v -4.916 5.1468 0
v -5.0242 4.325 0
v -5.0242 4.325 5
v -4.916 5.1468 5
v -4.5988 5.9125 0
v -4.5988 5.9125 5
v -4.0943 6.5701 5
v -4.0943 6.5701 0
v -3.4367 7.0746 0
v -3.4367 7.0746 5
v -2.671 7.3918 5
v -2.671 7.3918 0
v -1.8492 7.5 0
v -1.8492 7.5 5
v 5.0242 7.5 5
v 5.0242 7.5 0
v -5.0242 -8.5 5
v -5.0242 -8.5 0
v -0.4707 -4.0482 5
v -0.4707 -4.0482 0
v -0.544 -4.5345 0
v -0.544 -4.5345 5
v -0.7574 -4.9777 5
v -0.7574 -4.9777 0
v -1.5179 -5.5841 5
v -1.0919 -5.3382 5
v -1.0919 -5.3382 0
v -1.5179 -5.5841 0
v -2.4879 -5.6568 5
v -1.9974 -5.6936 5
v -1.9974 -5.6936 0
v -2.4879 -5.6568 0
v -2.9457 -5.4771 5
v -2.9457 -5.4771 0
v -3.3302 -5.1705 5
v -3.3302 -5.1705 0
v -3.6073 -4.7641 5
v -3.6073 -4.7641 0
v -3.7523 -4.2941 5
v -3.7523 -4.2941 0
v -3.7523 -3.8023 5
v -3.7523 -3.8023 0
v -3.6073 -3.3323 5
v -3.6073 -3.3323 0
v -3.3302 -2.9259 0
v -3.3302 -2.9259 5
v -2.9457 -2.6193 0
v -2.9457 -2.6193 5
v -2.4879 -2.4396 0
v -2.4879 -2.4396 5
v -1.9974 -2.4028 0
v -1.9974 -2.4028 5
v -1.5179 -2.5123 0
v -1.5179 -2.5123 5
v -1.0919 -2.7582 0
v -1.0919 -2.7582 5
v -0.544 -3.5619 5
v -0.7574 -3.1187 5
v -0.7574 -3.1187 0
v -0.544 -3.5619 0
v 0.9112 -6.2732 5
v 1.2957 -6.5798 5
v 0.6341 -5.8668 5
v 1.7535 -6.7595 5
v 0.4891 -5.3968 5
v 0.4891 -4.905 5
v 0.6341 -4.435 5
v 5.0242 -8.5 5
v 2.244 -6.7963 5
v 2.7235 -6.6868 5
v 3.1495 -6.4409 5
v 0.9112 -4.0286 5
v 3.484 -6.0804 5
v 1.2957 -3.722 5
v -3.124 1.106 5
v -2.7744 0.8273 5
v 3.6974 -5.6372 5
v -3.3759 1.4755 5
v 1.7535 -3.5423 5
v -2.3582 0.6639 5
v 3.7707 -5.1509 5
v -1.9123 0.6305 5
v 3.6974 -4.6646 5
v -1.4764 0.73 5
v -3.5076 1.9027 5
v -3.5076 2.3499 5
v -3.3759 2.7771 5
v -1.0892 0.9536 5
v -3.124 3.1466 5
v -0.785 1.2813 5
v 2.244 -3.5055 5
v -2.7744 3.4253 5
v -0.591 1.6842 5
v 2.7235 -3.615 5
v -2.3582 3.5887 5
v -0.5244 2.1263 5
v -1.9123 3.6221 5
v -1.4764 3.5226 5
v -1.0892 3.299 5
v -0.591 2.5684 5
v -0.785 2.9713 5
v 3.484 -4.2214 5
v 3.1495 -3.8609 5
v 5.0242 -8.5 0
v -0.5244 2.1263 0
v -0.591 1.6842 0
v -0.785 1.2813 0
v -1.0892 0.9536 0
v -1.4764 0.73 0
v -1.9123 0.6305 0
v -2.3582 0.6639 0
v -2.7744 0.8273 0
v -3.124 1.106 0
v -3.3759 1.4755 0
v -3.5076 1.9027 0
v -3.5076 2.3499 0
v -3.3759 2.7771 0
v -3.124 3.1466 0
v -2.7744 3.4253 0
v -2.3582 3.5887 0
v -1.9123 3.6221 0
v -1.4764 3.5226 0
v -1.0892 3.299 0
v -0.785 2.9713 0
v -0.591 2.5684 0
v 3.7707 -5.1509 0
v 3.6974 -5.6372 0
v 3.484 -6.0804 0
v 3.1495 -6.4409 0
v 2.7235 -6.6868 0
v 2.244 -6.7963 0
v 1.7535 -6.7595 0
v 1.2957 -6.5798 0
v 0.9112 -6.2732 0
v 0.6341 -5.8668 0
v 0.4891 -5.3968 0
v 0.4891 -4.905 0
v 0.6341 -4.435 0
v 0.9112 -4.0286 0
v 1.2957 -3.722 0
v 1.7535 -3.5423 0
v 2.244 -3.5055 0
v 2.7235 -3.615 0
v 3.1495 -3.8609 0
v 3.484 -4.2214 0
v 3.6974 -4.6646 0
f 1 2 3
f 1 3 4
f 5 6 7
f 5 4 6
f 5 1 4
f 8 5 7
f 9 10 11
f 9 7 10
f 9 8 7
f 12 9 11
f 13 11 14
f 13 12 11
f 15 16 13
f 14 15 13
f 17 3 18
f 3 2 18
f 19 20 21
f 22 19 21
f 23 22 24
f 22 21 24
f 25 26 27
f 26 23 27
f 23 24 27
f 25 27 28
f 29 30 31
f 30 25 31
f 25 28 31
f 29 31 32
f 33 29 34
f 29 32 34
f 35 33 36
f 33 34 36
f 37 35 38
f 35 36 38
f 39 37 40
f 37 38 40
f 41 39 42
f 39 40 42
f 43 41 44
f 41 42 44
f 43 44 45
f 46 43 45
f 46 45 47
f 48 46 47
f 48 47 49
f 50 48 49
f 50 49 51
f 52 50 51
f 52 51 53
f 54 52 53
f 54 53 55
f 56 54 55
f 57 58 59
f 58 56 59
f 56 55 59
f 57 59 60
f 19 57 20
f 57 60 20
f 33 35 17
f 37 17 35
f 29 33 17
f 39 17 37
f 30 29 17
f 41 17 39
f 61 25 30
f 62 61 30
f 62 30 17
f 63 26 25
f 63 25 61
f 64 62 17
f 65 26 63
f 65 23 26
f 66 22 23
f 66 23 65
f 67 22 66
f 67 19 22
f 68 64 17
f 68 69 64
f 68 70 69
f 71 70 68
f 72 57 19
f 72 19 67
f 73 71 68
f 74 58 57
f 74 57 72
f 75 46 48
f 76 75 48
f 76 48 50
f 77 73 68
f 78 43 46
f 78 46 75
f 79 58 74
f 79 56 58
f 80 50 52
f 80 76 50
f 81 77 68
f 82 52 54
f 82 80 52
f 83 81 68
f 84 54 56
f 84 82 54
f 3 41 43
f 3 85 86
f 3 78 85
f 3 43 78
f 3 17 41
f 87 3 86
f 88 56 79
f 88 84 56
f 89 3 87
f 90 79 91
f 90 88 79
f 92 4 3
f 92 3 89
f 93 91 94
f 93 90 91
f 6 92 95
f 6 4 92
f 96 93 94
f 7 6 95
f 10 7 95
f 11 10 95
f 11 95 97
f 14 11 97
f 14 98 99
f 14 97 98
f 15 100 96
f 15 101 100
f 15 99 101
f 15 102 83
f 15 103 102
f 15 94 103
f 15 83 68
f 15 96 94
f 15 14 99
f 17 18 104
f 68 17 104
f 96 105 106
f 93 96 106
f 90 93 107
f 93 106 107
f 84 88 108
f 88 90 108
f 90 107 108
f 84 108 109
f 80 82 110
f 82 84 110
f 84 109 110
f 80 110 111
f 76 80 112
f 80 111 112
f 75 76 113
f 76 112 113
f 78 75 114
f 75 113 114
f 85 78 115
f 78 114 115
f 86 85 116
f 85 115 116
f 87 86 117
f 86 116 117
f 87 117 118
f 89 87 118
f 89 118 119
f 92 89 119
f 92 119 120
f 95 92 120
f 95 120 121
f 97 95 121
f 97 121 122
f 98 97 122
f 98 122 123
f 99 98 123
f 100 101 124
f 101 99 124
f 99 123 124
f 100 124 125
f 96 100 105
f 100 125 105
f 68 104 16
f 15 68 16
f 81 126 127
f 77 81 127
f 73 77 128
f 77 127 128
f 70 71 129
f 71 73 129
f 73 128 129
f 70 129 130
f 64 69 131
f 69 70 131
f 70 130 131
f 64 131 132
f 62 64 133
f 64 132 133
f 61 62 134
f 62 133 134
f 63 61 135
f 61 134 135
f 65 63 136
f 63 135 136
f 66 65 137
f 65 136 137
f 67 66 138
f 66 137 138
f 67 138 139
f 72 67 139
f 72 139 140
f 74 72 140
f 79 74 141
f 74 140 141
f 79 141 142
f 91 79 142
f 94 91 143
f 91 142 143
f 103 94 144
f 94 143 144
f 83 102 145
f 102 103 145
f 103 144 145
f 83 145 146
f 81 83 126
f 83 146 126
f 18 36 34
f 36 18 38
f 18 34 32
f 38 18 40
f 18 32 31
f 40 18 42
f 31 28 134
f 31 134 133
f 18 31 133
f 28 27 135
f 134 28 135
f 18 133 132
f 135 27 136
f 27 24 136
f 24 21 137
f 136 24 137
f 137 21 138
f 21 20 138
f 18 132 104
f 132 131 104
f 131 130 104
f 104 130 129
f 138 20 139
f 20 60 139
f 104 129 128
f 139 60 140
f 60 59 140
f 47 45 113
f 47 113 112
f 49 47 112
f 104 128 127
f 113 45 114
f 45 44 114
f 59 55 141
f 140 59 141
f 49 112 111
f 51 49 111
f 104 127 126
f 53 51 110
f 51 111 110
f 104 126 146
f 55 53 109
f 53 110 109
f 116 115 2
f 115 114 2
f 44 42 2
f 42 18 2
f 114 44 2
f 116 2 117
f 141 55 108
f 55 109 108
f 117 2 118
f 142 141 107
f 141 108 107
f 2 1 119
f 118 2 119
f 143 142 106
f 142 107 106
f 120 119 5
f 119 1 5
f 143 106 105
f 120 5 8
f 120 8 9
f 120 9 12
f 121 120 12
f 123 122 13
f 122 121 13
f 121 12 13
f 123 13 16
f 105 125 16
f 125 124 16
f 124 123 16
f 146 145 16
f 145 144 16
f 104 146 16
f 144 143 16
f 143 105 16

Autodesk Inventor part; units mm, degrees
ref_plane "YZ Plane" through (0, 0, 0) normal (1, 0, 0) x (0, 1, 0)
ref_plane "XZ Plane" through (0, 0, 0) normal (0, 1, 0) x (-1, 0, 0)
ref_plane "XY Plane" through (0, 0, 0) normal (0, 0, 1) x (1, 0, 0)
sketch "Эскиз1" plane through (0, 0, 0) normal (0, 0, 1) x (1, 0, 0)
  circle A0 centre (-2.1207, -4.0482) radius 1.65
  circle A1 centre (2.1207, -5.1509) radius 1.65
  line L0 (-5.0242, 4.325) -> (-5.0242, -8.5)
  line L1 (5.0242, -8.5) -> (5.0242, 7.5)
  line L2 (5.0242, 7.5) -> (-1.8492, 7.5)
  circle A2 centre (-2.0244, 2.1263) radius 1.5
  arc A3 (-1.8492, 7.5) -> (-5.0242, 4.325) centre (-1.8492, 4.325) ccw
  line L3 (-5.0242, -8.5) -> (5.0242, -8.5)
  dimension "d0" = 3.175
  dimension "d1" = 3.3
  dimension "d2" = 3
  dimension "d3" = 3.3
extrude "Выдавливание1" add sketch "Эскиз1" along normal blind 5
properties part number "gates_top_holder"
